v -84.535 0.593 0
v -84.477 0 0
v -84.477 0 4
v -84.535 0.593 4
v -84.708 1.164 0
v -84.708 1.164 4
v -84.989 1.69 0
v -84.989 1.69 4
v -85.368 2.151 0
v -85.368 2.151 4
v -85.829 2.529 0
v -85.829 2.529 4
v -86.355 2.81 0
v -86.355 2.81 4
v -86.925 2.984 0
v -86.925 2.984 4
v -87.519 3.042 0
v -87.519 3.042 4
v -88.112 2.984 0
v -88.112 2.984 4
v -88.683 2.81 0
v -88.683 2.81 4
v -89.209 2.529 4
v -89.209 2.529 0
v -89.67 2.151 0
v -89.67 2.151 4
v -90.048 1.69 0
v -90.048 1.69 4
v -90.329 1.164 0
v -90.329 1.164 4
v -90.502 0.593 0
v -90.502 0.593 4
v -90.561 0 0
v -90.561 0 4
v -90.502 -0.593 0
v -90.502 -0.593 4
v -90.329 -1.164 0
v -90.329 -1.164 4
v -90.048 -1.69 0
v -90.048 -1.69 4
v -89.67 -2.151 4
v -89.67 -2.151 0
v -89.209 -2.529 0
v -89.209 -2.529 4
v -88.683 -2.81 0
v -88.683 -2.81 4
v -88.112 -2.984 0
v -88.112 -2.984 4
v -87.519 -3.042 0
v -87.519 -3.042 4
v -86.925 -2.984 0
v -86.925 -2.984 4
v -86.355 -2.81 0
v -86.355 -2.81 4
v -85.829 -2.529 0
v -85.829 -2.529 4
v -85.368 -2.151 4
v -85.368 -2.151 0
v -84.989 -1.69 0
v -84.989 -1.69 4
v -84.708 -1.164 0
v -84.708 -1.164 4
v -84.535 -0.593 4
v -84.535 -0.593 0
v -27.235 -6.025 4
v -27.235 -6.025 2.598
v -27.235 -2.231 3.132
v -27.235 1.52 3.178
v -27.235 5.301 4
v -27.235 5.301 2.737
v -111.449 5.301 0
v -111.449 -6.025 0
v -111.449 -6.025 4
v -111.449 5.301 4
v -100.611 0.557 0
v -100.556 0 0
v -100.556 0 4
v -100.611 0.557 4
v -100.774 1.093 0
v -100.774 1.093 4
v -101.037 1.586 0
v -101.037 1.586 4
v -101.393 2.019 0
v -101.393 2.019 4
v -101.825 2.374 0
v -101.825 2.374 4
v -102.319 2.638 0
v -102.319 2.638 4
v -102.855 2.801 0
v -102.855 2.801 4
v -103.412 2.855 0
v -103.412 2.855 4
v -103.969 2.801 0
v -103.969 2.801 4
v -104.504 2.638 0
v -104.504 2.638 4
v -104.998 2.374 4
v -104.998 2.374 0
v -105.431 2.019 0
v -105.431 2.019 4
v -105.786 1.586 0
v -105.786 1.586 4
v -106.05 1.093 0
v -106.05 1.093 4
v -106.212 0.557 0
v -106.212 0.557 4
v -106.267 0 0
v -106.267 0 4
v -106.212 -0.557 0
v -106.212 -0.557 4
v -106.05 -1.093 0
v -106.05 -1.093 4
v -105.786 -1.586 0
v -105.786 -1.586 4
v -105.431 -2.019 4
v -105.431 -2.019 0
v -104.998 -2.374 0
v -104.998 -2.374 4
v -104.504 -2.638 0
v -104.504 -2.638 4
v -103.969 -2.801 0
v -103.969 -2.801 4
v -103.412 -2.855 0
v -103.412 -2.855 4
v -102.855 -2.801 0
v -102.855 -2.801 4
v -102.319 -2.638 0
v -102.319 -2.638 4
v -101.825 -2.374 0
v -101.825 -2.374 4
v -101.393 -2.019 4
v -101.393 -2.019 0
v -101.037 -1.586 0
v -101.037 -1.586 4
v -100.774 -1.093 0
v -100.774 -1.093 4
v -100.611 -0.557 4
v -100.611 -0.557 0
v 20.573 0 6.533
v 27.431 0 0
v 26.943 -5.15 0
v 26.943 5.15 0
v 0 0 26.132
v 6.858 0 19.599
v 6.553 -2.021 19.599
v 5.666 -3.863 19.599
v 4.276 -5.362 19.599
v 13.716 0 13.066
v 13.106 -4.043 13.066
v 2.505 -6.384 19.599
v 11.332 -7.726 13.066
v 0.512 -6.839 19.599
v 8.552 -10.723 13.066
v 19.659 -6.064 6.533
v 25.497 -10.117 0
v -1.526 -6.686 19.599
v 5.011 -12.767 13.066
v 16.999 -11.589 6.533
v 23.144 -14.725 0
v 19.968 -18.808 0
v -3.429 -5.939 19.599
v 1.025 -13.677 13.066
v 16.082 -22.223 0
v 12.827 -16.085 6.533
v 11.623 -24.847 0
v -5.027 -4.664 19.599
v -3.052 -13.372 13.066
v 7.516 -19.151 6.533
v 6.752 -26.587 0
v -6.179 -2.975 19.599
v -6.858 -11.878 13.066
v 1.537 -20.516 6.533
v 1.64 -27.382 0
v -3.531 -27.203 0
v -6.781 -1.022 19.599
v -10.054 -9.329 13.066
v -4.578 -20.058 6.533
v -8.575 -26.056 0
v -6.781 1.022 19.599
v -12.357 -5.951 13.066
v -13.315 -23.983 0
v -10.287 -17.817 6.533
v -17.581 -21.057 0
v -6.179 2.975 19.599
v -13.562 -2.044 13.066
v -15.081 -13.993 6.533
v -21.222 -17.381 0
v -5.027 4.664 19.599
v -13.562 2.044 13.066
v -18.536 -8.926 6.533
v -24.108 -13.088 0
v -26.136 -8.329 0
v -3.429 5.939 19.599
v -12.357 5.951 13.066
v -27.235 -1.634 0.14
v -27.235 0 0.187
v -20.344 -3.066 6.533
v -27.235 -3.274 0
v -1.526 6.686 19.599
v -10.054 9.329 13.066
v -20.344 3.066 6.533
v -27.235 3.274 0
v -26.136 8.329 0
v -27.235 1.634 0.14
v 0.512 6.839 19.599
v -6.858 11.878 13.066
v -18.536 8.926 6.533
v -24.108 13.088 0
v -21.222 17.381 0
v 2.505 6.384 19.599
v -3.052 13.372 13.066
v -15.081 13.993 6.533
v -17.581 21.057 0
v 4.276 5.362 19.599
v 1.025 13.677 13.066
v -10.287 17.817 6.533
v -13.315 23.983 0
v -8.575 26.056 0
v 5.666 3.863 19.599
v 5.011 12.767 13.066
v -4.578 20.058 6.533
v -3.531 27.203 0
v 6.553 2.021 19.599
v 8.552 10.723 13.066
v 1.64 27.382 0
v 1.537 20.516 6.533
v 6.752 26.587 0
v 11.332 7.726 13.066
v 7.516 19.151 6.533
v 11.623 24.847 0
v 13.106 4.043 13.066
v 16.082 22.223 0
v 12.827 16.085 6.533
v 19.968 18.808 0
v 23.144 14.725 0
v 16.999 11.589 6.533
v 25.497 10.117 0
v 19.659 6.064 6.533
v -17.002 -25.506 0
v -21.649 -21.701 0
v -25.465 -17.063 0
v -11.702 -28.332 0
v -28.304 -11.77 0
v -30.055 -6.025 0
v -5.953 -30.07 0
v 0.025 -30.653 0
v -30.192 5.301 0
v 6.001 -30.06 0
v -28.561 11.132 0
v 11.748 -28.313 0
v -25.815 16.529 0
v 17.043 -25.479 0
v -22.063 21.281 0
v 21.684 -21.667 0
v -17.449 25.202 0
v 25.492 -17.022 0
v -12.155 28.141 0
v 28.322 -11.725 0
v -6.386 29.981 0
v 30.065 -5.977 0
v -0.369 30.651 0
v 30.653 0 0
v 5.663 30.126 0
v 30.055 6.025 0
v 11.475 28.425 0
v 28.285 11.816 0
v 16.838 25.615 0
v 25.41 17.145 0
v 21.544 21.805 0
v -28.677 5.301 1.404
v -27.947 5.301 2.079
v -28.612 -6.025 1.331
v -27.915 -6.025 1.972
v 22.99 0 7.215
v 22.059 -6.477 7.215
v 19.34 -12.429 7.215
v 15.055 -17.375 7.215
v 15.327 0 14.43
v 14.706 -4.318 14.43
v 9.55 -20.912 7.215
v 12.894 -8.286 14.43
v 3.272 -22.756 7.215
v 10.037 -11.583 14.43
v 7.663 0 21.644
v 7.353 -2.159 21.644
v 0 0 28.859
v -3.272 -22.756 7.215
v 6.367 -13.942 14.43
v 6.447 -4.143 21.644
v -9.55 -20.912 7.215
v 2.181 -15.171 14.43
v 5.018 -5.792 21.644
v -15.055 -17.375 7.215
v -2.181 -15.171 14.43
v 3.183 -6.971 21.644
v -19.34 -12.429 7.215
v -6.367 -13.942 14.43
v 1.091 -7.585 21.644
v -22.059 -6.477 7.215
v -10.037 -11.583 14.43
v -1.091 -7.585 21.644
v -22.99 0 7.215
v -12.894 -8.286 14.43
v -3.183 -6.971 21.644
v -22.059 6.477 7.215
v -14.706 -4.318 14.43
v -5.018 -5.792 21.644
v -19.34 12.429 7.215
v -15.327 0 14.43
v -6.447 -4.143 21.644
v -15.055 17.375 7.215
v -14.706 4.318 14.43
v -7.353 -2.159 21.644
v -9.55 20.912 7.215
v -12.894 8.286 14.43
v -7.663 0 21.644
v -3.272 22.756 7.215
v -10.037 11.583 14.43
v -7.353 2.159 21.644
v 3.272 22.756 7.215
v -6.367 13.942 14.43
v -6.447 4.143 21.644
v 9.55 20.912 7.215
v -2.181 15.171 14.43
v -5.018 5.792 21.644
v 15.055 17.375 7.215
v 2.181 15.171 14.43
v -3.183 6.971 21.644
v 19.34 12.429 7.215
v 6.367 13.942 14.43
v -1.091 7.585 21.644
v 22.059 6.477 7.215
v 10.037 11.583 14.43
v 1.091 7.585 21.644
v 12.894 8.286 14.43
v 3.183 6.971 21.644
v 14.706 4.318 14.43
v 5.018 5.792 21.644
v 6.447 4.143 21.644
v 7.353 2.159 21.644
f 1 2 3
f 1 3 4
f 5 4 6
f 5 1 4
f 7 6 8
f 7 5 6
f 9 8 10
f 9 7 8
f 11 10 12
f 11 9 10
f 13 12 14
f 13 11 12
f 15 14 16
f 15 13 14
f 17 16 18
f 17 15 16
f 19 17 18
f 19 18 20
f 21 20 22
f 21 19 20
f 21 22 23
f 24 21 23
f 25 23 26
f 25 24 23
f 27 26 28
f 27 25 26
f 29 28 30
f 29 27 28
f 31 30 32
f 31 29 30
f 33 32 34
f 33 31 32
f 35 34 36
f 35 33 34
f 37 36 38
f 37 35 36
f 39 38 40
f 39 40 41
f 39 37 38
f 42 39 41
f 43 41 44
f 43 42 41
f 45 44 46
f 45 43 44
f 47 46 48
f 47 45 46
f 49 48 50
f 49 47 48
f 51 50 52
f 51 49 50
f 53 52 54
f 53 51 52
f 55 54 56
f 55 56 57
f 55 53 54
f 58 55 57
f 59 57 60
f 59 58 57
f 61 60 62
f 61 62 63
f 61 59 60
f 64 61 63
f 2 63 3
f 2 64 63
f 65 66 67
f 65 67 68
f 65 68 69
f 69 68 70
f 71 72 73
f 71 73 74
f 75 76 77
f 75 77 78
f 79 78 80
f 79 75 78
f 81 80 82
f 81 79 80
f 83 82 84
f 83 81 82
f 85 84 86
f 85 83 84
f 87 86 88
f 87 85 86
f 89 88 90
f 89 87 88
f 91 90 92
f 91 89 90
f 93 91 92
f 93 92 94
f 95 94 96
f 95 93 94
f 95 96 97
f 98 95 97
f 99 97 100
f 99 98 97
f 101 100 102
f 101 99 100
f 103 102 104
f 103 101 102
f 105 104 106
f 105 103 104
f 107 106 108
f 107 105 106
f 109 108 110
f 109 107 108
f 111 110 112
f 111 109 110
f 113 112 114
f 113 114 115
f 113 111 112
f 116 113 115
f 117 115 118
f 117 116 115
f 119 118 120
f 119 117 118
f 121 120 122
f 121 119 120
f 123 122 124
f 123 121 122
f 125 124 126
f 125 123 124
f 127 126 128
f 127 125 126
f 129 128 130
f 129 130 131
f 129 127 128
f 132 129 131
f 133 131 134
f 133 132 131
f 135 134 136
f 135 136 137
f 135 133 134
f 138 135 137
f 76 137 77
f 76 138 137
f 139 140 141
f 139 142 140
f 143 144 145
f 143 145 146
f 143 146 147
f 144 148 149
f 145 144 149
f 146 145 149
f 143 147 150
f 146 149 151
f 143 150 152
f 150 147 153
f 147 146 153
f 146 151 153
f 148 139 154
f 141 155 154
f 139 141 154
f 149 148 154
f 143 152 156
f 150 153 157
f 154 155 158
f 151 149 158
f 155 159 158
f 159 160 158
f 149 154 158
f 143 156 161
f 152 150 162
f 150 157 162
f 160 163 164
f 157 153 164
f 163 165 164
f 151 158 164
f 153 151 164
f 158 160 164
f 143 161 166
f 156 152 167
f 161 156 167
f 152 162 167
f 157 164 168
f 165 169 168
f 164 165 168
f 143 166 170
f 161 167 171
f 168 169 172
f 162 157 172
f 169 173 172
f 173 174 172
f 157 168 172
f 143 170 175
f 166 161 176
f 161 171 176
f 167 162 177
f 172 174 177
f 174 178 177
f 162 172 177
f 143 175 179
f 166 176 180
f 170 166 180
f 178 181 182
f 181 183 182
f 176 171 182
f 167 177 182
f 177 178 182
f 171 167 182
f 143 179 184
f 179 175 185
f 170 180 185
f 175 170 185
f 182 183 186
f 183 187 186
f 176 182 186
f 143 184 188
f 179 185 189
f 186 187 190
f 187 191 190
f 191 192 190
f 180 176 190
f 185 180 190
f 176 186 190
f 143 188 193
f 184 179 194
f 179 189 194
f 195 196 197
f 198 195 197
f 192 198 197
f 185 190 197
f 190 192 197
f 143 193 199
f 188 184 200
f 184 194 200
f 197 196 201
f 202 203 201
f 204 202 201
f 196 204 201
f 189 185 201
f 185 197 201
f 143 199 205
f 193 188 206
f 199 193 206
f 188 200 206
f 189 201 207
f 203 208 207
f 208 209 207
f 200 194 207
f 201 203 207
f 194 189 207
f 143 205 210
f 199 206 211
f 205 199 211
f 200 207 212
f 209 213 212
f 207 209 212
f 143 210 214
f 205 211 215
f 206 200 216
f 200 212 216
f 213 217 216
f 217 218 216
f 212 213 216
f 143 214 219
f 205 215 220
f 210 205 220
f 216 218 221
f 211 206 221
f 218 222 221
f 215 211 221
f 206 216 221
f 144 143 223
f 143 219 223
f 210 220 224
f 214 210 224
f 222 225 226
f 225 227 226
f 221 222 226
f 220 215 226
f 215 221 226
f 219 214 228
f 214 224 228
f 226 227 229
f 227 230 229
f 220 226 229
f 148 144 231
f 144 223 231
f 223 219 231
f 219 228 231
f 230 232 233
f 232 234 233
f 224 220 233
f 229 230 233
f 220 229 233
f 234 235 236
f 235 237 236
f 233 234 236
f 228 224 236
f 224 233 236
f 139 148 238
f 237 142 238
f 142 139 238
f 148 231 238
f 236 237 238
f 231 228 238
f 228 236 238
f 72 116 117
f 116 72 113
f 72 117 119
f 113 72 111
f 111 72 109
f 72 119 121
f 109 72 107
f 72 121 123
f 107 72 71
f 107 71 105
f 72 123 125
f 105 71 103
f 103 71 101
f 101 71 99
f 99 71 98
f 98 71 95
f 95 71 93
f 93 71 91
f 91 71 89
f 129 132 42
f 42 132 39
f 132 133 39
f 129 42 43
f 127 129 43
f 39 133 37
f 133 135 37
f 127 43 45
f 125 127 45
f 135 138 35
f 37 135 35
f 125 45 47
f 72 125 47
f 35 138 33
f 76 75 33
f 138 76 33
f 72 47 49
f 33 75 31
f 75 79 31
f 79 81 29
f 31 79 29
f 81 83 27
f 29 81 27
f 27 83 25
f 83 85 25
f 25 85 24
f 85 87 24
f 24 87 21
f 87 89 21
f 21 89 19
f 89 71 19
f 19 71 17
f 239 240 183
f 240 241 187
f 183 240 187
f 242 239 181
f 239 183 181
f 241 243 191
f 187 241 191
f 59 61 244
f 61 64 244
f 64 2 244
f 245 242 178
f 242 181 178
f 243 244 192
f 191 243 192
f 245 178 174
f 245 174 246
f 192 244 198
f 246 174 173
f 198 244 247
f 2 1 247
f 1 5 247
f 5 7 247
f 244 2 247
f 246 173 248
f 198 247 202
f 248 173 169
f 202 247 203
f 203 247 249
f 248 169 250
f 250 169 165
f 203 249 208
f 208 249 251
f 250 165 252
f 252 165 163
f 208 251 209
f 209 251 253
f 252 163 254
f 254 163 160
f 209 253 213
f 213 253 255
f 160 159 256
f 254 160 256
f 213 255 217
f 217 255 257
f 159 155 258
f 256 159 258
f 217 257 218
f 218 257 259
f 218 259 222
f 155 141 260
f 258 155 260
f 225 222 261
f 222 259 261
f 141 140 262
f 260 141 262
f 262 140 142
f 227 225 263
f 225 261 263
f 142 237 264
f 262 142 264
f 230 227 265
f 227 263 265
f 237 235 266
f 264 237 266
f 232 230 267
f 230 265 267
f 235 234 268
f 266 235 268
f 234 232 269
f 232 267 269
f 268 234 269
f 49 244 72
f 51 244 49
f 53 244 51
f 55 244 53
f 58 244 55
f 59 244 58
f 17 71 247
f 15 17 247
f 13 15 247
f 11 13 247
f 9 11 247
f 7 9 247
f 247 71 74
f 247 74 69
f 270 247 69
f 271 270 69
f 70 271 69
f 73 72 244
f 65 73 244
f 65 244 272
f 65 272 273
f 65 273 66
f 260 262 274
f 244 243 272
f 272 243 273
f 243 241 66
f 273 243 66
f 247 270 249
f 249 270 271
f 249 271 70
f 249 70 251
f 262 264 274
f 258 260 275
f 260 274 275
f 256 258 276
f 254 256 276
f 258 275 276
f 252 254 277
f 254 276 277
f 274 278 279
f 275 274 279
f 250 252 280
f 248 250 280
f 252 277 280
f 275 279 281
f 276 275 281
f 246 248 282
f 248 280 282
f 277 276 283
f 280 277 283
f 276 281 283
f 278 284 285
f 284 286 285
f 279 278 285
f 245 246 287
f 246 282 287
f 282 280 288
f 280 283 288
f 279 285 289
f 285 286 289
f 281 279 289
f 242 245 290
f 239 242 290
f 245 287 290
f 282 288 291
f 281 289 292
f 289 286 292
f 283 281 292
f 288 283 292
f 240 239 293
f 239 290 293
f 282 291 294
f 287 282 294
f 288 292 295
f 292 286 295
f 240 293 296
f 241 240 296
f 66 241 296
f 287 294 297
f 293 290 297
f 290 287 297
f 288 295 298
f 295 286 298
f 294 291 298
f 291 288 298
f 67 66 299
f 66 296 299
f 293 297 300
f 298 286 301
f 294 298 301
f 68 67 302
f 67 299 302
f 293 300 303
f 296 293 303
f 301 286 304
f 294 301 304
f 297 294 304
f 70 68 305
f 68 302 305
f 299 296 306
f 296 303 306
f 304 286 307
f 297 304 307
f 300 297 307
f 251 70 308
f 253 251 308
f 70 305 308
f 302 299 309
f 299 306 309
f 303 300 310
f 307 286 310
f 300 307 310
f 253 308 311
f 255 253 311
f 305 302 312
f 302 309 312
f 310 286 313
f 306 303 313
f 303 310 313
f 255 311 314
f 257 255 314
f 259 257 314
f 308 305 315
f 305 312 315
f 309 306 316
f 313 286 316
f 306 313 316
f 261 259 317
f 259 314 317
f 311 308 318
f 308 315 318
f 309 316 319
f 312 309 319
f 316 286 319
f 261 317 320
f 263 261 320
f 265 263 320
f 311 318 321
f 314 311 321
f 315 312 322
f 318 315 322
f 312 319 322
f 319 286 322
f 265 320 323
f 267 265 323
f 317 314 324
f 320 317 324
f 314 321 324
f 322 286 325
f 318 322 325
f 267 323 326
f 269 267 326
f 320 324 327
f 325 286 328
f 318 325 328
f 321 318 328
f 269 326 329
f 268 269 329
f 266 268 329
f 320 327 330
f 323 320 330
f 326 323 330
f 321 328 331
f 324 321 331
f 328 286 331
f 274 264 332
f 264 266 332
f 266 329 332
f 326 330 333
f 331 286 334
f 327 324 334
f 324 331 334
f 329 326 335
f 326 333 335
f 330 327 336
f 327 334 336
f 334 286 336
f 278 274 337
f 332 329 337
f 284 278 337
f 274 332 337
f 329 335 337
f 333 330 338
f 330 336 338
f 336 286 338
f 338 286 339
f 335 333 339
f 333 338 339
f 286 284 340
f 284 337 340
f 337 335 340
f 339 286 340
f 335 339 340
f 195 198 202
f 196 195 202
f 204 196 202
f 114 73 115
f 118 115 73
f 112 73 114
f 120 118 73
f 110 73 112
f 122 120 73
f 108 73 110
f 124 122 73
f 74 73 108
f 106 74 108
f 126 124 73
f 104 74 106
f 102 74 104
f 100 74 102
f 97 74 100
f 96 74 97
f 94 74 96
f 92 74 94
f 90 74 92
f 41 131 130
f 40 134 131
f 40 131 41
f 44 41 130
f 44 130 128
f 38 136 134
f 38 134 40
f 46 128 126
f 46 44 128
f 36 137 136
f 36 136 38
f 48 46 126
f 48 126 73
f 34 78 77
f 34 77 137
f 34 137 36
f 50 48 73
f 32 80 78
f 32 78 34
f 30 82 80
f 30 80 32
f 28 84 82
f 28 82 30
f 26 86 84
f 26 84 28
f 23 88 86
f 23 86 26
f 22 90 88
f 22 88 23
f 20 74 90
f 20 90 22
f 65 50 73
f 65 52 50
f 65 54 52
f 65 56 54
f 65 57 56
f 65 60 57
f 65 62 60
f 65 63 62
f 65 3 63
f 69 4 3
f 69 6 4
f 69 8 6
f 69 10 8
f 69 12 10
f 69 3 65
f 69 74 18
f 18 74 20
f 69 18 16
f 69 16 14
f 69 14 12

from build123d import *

# Parameters (mm, degrees)
F2_W     = 84.214361
F2_H     = 11.32601
F2_R     = 2.855499
F2_R_2   = 3.042047
F3_DEPTH = 4


with BuildPart() as f1:
    # F0 (on Front) → F1 (revolve)
    with BuildSketch(Plane.XZ):
        Polygon((0, 28.85901), (0, 26.132483), (27.431142, 0), (30.653402, 0), align=None)
    revolve(axis=Axis((0, 0, 13.066242), (0, 0, -1)))

    # F2 (on Top) → F3 (join)
    with BuildSketch(Plane.XY):
        with Locations((-69.342299, -0.36225)):
            Rectangle(F2_W, F2_H)
        with Locations((-103.411667, 0)):
            Circle(F2_R, mode=Mode.SUBTRACT)
        with Locations((-87.518722, 0)):
            Circle(F2_R_2, mode=Mode.SUBTRACT)
    extrude(amount=F3_DEPTH)


solid = f1.part
